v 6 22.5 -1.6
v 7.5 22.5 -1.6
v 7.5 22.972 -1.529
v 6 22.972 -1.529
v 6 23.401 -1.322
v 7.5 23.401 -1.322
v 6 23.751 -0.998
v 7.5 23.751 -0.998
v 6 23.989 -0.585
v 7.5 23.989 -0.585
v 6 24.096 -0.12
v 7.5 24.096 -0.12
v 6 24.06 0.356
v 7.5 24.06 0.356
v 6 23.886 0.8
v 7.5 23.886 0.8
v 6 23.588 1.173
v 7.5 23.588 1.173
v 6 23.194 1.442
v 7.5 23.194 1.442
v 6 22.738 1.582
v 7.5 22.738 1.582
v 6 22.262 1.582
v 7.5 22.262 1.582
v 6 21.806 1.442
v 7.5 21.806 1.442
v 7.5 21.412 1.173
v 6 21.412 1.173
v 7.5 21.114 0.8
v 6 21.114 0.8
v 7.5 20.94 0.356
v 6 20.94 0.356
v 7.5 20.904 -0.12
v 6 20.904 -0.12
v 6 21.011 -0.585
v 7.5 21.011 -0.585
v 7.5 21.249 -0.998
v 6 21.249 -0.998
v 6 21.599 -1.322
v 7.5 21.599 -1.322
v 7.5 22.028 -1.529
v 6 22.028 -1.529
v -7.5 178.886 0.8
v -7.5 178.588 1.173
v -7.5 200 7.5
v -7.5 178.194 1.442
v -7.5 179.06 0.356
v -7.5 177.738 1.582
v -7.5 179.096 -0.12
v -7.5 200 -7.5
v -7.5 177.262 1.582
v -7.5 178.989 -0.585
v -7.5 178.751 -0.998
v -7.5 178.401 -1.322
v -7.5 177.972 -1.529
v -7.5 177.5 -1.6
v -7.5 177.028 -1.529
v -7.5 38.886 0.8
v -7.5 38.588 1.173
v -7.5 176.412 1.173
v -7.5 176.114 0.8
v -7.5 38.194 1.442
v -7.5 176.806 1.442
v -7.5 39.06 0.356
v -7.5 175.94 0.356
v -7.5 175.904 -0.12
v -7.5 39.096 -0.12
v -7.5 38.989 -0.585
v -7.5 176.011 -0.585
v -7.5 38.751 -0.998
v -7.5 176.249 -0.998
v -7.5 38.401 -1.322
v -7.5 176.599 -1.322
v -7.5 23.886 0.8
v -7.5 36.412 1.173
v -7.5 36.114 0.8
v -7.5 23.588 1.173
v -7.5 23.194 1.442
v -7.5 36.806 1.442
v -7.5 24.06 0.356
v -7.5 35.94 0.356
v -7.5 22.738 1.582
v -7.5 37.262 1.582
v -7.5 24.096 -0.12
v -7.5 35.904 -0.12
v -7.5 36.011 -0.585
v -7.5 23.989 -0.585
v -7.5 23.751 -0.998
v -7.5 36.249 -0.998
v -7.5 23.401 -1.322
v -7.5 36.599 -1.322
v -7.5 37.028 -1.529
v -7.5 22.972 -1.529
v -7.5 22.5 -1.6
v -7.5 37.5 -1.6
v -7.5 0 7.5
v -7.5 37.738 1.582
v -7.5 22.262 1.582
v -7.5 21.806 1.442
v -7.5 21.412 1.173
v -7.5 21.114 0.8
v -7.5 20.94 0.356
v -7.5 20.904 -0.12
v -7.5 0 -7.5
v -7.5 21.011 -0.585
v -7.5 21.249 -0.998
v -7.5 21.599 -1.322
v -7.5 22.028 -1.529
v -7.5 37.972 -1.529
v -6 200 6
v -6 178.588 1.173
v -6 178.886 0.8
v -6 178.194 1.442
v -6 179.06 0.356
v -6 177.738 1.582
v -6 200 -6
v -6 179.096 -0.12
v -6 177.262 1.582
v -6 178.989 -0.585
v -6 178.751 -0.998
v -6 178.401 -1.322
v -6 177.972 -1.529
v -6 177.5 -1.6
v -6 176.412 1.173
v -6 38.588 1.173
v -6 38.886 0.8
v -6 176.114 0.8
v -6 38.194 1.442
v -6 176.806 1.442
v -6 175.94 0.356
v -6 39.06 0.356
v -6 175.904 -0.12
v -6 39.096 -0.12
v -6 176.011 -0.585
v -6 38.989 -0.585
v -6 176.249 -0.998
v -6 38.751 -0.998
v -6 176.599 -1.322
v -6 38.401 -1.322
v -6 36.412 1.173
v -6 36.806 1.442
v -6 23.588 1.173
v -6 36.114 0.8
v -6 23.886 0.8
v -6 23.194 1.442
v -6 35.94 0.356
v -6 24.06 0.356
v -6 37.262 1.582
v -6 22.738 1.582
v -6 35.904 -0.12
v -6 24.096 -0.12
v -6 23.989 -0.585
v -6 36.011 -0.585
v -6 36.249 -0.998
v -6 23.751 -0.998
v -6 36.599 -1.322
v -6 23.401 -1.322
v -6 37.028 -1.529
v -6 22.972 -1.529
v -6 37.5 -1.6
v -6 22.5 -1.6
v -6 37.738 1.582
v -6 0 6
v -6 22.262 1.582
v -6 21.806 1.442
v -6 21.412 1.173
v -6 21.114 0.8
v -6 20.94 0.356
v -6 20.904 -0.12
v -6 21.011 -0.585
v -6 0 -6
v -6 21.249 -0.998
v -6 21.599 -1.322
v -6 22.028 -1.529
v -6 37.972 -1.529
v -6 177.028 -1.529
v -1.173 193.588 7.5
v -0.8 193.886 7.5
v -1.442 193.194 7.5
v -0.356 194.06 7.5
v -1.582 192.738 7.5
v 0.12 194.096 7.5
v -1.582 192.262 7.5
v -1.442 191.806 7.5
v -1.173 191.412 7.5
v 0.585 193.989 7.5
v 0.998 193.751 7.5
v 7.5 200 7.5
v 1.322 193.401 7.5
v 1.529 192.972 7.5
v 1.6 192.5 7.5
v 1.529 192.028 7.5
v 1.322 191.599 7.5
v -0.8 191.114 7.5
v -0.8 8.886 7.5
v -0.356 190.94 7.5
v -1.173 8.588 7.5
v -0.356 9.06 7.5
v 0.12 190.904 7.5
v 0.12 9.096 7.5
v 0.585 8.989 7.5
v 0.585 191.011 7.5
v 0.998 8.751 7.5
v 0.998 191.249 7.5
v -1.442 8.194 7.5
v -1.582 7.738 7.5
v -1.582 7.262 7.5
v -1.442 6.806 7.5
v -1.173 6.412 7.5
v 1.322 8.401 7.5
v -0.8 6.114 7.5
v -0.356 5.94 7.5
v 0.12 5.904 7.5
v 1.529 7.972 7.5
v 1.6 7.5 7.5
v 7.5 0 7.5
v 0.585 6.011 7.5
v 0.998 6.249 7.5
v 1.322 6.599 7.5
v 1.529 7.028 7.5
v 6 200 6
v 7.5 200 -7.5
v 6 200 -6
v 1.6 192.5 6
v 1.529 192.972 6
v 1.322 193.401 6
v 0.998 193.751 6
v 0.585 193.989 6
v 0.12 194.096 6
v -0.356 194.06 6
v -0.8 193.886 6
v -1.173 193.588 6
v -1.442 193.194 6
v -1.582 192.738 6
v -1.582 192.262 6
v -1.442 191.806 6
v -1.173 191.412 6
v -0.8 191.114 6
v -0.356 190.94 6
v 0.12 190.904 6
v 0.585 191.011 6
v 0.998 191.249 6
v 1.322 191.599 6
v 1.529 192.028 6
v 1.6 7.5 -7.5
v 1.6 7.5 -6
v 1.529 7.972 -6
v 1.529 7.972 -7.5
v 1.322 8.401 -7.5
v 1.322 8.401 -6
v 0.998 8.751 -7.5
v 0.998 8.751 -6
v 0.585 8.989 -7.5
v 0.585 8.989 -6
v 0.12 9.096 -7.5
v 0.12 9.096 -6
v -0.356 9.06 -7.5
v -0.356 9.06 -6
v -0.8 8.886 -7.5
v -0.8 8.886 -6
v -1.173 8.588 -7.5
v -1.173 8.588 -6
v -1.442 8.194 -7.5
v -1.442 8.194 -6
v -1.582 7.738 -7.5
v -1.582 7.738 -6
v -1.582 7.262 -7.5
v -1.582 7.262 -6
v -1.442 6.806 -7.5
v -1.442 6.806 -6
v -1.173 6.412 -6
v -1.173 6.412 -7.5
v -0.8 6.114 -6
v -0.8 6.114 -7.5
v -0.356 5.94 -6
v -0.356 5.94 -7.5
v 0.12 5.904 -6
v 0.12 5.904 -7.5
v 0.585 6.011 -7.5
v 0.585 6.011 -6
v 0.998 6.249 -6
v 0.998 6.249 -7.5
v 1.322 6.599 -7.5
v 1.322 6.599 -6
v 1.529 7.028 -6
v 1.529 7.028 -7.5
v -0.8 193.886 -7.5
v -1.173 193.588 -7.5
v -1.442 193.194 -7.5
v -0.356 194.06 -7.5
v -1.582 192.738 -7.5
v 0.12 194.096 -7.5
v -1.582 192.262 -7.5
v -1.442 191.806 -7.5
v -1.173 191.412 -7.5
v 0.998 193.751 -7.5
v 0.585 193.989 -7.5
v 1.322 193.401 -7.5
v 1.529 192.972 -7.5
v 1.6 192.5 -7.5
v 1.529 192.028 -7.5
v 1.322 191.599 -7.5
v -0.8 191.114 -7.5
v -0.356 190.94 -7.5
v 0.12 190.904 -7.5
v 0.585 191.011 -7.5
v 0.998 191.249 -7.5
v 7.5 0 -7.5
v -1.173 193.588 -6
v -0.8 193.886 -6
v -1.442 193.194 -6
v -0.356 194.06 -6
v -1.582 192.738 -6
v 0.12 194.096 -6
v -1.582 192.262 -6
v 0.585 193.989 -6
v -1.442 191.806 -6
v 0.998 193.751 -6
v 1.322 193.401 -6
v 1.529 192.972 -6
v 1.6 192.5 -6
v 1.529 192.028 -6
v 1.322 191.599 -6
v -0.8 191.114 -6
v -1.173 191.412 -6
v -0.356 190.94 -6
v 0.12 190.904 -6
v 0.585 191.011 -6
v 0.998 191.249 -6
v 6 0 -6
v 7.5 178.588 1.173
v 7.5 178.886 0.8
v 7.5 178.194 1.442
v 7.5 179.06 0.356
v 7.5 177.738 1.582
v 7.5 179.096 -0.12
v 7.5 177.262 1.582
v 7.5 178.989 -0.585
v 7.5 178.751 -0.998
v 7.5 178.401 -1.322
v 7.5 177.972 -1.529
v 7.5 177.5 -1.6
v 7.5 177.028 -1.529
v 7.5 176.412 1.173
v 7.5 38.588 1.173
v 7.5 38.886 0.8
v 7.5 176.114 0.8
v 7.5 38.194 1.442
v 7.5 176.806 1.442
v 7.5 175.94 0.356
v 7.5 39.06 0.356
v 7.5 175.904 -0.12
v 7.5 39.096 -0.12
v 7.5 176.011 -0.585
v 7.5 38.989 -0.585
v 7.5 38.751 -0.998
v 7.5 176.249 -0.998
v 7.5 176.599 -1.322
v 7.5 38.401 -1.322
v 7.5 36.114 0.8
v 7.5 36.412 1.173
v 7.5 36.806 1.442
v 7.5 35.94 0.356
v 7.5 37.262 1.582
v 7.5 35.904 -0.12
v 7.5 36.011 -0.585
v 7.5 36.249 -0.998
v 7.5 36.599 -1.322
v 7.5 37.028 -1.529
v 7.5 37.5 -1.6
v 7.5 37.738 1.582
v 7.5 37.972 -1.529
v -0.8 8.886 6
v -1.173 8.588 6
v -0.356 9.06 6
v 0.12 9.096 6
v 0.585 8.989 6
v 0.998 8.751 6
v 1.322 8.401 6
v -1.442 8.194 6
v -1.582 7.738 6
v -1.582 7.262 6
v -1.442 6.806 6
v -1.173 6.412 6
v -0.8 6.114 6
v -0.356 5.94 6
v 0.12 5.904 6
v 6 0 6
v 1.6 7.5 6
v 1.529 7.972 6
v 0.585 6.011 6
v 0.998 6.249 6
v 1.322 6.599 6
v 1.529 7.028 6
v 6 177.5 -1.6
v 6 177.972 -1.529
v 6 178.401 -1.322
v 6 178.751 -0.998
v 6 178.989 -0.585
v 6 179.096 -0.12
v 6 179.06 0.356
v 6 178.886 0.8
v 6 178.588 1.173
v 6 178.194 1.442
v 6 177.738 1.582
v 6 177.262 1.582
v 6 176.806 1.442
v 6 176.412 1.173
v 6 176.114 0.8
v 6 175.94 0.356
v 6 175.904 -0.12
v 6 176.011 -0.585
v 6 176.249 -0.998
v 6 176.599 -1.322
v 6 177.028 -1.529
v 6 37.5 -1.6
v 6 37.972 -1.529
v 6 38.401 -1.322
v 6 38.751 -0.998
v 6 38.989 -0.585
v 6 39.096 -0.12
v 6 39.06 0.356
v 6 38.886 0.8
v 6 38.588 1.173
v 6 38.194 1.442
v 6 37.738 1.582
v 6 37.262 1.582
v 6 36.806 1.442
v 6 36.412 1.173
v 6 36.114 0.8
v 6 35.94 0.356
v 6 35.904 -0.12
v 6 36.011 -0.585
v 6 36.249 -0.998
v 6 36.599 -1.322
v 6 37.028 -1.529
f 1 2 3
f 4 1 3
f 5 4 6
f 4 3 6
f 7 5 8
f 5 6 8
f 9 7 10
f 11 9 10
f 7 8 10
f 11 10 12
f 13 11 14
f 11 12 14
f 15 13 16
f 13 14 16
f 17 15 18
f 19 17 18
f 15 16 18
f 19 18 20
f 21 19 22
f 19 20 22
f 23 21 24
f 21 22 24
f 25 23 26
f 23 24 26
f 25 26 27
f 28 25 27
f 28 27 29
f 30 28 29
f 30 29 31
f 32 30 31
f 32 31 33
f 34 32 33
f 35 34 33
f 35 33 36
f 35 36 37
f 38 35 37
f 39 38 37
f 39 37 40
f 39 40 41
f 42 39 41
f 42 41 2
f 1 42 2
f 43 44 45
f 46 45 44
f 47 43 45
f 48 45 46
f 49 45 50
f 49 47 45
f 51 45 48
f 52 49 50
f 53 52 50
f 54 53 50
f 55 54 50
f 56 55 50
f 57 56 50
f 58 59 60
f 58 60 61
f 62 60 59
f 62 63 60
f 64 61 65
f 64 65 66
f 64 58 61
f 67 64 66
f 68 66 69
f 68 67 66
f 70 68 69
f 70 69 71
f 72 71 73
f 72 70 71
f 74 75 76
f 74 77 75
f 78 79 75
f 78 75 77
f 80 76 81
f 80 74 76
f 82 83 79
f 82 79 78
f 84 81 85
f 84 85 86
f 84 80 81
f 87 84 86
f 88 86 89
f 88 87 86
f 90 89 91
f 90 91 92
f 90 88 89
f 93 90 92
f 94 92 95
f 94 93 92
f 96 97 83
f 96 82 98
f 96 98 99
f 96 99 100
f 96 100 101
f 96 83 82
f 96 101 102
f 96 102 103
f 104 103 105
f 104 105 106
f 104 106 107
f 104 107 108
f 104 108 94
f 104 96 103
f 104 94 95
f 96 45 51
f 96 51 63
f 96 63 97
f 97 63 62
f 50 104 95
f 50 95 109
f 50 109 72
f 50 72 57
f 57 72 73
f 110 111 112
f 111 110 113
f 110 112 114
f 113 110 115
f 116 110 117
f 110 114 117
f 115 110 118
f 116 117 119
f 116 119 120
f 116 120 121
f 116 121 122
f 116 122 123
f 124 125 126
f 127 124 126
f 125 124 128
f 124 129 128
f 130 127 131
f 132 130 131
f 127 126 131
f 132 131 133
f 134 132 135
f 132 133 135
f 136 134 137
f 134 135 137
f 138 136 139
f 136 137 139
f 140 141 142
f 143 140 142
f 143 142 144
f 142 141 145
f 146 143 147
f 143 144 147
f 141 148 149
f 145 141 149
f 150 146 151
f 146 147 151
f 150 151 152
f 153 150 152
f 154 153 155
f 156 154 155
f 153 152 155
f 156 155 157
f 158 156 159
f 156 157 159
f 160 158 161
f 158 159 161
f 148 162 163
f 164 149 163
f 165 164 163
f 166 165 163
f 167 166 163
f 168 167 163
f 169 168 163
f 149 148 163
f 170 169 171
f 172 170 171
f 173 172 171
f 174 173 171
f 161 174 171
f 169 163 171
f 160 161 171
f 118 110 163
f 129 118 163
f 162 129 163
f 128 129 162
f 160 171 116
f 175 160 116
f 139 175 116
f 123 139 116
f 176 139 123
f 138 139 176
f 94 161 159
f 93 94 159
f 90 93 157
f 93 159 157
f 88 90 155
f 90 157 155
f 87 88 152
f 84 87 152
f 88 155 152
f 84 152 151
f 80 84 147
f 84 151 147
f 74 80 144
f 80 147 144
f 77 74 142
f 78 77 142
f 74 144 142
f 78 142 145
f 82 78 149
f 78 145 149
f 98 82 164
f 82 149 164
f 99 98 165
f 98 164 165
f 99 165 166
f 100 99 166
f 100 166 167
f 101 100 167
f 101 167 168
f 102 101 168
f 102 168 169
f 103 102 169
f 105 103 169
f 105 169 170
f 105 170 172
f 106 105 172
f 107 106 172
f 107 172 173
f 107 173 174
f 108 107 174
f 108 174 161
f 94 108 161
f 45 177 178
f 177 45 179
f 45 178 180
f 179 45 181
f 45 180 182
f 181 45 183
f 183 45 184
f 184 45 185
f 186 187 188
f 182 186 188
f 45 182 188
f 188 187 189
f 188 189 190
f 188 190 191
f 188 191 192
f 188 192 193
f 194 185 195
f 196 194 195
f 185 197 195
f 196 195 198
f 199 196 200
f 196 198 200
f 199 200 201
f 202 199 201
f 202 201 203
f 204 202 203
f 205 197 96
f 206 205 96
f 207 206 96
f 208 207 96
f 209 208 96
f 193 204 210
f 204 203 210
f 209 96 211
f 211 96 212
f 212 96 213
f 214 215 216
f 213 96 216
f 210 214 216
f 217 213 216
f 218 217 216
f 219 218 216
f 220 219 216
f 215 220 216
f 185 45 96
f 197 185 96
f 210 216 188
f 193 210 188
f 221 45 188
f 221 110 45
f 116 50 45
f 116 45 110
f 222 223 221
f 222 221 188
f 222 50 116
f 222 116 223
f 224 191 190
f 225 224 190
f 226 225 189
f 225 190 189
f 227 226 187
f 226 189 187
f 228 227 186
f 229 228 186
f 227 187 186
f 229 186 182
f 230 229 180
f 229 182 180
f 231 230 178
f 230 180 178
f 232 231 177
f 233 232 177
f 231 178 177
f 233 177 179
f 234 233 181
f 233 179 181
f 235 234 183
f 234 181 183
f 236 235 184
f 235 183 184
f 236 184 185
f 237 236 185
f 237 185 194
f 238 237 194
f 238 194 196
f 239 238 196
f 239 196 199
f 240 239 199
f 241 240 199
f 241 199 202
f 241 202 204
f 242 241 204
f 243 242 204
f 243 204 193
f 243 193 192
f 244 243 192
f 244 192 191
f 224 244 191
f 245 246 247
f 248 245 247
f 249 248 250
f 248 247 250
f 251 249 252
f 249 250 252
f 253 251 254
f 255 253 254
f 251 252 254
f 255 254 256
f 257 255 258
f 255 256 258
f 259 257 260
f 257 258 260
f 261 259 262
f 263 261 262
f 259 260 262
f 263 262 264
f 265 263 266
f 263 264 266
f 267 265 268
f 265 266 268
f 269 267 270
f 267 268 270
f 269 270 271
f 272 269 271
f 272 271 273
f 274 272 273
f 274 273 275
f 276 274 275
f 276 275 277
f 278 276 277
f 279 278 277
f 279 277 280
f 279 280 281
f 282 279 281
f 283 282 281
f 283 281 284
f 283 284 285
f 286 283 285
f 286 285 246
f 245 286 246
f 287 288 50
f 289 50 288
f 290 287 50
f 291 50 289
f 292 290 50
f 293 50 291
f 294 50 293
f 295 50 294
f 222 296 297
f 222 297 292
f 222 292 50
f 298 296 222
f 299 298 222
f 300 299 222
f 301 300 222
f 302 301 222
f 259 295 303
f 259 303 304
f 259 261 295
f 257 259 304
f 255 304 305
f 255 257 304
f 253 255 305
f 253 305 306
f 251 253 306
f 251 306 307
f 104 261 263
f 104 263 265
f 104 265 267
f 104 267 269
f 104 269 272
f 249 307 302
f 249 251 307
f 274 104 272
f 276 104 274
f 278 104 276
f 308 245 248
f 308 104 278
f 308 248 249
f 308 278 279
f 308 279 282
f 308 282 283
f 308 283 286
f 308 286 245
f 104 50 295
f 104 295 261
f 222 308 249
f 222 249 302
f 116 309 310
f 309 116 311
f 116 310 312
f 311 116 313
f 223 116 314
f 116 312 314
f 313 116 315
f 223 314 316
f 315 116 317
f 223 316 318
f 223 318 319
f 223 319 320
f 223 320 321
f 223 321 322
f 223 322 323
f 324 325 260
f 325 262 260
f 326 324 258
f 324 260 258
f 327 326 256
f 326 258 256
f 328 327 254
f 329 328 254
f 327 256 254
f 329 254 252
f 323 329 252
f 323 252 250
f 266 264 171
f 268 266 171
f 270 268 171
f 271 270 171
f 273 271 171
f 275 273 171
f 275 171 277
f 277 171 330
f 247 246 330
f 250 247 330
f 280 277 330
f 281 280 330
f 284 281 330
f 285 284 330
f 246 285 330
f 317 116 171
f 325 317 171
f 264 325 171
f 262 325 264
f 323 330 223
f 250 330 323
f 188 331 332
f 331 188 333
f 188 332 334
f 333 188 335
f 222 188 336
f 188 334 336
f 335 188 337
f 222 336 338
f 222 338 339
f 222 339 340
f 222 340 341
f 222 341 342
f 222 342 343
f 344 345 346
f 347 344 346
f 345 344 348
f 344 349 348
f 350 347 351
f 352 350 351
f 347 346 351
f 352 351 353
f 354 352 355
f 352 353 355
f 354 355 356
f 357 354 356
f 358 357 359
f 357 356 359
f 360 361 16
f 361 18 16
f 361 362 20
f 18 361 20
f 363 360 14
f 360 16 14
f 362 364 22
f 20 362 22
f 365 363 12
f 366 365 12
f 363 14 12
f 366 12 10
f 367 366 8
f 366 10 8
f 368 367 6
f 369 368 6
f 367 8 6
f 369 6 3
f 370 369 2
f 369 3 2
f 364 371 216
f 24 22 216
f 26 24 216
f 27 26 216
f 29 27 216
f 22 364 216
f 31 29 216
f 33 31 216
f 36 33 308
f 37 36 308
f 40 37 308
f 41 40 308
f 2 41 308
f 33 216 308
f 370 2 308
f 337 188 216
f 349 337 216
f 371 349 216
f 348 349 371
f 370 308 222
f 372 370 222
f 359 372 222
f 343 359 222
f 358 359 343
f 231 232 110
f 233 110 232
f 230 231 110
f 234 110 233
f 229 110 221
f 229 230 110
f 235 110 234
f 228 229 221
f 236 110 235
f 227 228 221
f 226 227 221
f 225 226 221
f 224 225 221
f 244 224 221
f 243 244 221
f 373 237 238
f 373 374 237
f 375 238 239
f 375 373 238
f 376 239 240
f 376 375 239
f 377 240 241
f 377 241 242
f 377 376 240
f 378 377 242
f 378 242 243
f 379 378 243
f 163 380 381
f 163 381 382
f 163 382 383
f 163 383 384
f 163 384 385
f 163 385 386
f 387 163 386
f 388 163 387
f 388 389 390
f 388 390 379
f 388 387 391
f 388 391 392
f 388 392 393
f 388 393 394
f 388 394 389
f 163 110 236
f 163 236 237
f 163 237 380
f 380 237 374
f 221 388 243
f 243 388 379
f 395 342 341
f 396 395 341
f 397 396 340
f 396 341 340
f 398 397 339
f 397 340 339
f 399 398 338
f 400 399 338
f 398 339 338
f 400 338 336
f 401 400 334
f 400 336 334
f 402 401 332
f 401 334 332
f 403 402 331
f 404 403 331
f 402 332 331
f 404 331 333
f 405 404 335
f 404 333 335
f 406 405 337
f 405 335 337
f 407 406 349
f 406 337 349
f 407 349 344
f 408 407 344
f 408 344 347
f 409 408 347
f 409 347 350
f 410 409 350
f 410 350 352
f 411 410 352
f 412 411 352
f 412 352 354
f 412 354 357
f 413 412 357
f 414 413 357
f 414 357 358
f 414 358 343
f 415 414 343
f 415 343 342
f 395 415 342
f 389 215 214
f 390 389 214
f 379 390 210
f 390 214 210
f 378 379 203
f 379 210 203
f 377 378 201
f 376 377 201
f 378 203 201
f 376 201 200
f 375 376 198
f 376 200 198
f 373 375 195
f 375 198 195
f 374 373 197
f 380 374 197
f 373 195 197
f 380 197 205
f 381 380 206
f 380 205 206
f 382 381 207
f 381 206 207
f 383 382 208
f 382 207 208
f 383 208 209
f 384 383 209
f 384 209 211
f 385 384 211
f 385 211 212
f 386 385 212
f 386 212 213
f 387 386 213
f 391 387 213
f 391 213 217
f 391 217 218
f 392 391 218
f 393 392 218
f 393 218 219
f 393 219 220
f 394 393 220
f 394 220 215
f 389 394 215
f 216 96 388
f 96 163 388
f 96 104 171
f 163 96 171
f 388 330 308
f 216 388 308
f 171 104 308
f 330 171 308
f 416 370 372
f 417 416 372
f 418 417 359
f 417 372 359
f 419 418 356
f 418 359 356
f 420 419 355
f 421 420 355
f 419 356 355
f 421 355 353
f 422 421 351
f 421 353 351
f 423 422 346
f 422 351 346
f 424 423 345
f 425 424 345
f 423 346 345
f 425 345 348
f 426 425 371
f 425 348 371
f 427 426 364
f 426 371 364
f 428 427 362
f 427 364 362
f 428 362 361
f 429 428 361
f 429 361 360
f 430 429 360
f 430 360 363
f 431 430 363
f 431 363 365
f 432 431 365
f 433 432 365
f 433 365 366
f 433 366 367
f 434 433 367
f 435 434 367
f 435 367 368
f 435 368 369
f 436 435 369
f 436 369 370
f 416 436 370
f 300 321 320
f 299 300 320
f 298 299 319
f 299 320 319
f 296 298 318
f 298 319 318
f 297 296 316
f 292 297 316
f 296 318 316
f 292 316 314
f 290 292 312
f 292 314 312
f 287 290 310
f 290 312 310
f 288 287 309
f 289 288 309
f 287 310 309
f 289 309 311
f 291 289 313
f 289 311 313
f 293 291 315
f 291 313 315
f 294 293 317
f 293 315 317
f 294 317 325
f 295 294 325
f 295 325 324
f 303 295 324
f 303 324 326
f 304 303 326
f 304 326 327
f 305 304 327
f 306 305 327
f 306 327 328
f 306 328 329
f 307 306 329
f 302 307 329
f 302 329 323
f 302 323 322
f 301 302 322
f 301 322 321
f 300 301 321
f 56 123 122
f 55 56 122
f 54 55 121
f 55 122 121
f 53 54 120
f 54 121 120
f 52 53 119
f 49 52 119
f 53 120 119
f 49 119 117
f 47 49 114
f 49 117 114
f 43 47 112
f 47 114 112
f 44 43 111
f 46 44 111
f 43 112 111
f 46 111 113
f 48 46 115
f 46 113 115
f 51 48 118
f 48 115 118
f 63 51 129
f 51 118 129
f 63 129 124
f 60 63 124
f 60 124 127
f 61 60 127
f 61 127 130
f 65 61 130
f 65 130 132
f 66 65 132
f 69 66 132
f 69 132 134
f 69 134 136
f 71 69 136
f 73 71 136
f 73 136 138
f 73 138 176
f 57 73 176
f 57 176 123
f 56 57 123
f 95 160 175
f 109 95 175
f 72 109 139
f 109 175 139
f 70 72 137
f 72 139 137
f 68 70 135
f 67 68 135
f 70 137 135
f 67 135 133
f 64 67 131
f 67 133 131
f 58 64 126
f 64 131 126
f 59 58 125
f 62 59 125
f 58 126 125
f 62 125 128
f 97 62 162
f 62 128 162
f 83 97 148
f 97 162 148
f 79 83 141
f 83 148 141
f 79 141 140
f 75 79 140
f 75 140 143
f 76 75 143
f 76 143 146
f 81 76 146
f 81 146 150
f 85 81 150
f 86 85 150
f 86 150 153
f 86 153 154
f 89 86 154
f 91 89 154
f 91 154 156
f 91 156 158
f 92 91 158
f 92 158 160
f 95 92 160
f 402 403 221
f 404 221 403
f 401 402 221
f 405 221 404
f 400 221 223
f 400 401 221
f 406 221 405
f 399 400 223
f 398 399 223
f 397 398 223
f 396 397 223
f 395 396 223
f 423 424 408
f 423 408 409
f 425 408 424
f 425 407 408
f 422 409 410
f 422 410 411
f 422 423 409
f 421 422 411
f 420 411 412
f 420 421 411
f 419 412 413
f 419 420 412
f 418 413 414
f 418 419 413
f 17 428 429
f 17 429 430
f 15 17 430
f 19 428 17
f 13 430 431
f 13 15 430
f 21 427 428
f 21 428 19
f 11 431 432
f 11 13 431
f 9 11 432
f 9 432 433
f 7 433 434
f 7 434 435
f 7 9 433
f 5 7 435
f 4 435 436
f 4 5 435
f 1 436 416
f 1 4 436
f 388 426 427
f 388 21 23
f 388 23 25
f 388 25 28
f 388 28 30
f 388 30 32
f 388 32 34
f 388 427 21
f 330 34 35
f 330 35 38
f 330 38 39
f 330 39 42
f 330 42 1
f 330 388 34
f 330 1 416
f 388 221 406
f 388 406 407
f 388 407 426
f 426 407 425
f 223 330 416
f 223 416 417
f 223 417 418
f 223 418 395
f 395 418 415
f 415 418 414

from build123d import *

# Parameters (mm, degrees)
SKETCH_1_W          = 15
SKETCH_1_H          = 15
SKETCH_1_W_2        = 12
SKETCH_1_H_2        = 12
EXTRUDE_1_DEPTH     = 200
SKETCH_2_R          = 1.6
CUT_EXTRUDE_1_DEPTH = 201.701893364
SKETCH_3_R          = 1.6
CUT_EXTRUDE_2_DEPTH = 201.701893364


with BuildPart() as part:
    # ｽｹｯﾁ1 → ﾎﾞｽ - 押し出し1 (new body)
    with BuildSketch(Plane(origin=(0, 0, 0), x_dir=(1, 0, 0), z_dir=(0, 1, 0))):
        Rectangle(SKETCH_1_W, SKETCH_1_H)
        Rectangle(SKETCH_1_W_2, SKETCH_1_H_2, mode=Mode.SUBTRACT)
    extrude(amount=EXTRUDE_1_DEPTH)

    # ｽｹｯﾁ2 → ｶｯﾄ - 押し出し1 (cut, through all)
    with BuildSketch(Plane.XY.offset(7.5)):
        with Locations((0, 192.5)):
            Circle(SKETCH_2_R)
        with Locations((0, 7.5)):
            Circle(SKETCH_2_R)
    extrude(amount=-CUT_EXTRUDE_1_DEPTH, mode=Mode.SUBTRACT)

    # ｽｹｯﾁ3 → ｶｯﾄ - 押し出し2 (cut, through all)
    with BuildSketch(Plane(origin=(7.5, 0, 0), x_dir=(0, 0, -1), z_dir=(1, 0, 0))):
        with Locations((0, 177.5)):
            Circle(SKETCH_3_R)
        with Locations((0, 22.5)):
            Circle(SKETCH_3_R)
        with Locations((0, 37.5)):
            Circle(SKETCH_3_R)
    extrude(amount=-CUT_EXTRUDE_2_DEPTH, mode=Mode.SUBTRACT)


solid = part.part
